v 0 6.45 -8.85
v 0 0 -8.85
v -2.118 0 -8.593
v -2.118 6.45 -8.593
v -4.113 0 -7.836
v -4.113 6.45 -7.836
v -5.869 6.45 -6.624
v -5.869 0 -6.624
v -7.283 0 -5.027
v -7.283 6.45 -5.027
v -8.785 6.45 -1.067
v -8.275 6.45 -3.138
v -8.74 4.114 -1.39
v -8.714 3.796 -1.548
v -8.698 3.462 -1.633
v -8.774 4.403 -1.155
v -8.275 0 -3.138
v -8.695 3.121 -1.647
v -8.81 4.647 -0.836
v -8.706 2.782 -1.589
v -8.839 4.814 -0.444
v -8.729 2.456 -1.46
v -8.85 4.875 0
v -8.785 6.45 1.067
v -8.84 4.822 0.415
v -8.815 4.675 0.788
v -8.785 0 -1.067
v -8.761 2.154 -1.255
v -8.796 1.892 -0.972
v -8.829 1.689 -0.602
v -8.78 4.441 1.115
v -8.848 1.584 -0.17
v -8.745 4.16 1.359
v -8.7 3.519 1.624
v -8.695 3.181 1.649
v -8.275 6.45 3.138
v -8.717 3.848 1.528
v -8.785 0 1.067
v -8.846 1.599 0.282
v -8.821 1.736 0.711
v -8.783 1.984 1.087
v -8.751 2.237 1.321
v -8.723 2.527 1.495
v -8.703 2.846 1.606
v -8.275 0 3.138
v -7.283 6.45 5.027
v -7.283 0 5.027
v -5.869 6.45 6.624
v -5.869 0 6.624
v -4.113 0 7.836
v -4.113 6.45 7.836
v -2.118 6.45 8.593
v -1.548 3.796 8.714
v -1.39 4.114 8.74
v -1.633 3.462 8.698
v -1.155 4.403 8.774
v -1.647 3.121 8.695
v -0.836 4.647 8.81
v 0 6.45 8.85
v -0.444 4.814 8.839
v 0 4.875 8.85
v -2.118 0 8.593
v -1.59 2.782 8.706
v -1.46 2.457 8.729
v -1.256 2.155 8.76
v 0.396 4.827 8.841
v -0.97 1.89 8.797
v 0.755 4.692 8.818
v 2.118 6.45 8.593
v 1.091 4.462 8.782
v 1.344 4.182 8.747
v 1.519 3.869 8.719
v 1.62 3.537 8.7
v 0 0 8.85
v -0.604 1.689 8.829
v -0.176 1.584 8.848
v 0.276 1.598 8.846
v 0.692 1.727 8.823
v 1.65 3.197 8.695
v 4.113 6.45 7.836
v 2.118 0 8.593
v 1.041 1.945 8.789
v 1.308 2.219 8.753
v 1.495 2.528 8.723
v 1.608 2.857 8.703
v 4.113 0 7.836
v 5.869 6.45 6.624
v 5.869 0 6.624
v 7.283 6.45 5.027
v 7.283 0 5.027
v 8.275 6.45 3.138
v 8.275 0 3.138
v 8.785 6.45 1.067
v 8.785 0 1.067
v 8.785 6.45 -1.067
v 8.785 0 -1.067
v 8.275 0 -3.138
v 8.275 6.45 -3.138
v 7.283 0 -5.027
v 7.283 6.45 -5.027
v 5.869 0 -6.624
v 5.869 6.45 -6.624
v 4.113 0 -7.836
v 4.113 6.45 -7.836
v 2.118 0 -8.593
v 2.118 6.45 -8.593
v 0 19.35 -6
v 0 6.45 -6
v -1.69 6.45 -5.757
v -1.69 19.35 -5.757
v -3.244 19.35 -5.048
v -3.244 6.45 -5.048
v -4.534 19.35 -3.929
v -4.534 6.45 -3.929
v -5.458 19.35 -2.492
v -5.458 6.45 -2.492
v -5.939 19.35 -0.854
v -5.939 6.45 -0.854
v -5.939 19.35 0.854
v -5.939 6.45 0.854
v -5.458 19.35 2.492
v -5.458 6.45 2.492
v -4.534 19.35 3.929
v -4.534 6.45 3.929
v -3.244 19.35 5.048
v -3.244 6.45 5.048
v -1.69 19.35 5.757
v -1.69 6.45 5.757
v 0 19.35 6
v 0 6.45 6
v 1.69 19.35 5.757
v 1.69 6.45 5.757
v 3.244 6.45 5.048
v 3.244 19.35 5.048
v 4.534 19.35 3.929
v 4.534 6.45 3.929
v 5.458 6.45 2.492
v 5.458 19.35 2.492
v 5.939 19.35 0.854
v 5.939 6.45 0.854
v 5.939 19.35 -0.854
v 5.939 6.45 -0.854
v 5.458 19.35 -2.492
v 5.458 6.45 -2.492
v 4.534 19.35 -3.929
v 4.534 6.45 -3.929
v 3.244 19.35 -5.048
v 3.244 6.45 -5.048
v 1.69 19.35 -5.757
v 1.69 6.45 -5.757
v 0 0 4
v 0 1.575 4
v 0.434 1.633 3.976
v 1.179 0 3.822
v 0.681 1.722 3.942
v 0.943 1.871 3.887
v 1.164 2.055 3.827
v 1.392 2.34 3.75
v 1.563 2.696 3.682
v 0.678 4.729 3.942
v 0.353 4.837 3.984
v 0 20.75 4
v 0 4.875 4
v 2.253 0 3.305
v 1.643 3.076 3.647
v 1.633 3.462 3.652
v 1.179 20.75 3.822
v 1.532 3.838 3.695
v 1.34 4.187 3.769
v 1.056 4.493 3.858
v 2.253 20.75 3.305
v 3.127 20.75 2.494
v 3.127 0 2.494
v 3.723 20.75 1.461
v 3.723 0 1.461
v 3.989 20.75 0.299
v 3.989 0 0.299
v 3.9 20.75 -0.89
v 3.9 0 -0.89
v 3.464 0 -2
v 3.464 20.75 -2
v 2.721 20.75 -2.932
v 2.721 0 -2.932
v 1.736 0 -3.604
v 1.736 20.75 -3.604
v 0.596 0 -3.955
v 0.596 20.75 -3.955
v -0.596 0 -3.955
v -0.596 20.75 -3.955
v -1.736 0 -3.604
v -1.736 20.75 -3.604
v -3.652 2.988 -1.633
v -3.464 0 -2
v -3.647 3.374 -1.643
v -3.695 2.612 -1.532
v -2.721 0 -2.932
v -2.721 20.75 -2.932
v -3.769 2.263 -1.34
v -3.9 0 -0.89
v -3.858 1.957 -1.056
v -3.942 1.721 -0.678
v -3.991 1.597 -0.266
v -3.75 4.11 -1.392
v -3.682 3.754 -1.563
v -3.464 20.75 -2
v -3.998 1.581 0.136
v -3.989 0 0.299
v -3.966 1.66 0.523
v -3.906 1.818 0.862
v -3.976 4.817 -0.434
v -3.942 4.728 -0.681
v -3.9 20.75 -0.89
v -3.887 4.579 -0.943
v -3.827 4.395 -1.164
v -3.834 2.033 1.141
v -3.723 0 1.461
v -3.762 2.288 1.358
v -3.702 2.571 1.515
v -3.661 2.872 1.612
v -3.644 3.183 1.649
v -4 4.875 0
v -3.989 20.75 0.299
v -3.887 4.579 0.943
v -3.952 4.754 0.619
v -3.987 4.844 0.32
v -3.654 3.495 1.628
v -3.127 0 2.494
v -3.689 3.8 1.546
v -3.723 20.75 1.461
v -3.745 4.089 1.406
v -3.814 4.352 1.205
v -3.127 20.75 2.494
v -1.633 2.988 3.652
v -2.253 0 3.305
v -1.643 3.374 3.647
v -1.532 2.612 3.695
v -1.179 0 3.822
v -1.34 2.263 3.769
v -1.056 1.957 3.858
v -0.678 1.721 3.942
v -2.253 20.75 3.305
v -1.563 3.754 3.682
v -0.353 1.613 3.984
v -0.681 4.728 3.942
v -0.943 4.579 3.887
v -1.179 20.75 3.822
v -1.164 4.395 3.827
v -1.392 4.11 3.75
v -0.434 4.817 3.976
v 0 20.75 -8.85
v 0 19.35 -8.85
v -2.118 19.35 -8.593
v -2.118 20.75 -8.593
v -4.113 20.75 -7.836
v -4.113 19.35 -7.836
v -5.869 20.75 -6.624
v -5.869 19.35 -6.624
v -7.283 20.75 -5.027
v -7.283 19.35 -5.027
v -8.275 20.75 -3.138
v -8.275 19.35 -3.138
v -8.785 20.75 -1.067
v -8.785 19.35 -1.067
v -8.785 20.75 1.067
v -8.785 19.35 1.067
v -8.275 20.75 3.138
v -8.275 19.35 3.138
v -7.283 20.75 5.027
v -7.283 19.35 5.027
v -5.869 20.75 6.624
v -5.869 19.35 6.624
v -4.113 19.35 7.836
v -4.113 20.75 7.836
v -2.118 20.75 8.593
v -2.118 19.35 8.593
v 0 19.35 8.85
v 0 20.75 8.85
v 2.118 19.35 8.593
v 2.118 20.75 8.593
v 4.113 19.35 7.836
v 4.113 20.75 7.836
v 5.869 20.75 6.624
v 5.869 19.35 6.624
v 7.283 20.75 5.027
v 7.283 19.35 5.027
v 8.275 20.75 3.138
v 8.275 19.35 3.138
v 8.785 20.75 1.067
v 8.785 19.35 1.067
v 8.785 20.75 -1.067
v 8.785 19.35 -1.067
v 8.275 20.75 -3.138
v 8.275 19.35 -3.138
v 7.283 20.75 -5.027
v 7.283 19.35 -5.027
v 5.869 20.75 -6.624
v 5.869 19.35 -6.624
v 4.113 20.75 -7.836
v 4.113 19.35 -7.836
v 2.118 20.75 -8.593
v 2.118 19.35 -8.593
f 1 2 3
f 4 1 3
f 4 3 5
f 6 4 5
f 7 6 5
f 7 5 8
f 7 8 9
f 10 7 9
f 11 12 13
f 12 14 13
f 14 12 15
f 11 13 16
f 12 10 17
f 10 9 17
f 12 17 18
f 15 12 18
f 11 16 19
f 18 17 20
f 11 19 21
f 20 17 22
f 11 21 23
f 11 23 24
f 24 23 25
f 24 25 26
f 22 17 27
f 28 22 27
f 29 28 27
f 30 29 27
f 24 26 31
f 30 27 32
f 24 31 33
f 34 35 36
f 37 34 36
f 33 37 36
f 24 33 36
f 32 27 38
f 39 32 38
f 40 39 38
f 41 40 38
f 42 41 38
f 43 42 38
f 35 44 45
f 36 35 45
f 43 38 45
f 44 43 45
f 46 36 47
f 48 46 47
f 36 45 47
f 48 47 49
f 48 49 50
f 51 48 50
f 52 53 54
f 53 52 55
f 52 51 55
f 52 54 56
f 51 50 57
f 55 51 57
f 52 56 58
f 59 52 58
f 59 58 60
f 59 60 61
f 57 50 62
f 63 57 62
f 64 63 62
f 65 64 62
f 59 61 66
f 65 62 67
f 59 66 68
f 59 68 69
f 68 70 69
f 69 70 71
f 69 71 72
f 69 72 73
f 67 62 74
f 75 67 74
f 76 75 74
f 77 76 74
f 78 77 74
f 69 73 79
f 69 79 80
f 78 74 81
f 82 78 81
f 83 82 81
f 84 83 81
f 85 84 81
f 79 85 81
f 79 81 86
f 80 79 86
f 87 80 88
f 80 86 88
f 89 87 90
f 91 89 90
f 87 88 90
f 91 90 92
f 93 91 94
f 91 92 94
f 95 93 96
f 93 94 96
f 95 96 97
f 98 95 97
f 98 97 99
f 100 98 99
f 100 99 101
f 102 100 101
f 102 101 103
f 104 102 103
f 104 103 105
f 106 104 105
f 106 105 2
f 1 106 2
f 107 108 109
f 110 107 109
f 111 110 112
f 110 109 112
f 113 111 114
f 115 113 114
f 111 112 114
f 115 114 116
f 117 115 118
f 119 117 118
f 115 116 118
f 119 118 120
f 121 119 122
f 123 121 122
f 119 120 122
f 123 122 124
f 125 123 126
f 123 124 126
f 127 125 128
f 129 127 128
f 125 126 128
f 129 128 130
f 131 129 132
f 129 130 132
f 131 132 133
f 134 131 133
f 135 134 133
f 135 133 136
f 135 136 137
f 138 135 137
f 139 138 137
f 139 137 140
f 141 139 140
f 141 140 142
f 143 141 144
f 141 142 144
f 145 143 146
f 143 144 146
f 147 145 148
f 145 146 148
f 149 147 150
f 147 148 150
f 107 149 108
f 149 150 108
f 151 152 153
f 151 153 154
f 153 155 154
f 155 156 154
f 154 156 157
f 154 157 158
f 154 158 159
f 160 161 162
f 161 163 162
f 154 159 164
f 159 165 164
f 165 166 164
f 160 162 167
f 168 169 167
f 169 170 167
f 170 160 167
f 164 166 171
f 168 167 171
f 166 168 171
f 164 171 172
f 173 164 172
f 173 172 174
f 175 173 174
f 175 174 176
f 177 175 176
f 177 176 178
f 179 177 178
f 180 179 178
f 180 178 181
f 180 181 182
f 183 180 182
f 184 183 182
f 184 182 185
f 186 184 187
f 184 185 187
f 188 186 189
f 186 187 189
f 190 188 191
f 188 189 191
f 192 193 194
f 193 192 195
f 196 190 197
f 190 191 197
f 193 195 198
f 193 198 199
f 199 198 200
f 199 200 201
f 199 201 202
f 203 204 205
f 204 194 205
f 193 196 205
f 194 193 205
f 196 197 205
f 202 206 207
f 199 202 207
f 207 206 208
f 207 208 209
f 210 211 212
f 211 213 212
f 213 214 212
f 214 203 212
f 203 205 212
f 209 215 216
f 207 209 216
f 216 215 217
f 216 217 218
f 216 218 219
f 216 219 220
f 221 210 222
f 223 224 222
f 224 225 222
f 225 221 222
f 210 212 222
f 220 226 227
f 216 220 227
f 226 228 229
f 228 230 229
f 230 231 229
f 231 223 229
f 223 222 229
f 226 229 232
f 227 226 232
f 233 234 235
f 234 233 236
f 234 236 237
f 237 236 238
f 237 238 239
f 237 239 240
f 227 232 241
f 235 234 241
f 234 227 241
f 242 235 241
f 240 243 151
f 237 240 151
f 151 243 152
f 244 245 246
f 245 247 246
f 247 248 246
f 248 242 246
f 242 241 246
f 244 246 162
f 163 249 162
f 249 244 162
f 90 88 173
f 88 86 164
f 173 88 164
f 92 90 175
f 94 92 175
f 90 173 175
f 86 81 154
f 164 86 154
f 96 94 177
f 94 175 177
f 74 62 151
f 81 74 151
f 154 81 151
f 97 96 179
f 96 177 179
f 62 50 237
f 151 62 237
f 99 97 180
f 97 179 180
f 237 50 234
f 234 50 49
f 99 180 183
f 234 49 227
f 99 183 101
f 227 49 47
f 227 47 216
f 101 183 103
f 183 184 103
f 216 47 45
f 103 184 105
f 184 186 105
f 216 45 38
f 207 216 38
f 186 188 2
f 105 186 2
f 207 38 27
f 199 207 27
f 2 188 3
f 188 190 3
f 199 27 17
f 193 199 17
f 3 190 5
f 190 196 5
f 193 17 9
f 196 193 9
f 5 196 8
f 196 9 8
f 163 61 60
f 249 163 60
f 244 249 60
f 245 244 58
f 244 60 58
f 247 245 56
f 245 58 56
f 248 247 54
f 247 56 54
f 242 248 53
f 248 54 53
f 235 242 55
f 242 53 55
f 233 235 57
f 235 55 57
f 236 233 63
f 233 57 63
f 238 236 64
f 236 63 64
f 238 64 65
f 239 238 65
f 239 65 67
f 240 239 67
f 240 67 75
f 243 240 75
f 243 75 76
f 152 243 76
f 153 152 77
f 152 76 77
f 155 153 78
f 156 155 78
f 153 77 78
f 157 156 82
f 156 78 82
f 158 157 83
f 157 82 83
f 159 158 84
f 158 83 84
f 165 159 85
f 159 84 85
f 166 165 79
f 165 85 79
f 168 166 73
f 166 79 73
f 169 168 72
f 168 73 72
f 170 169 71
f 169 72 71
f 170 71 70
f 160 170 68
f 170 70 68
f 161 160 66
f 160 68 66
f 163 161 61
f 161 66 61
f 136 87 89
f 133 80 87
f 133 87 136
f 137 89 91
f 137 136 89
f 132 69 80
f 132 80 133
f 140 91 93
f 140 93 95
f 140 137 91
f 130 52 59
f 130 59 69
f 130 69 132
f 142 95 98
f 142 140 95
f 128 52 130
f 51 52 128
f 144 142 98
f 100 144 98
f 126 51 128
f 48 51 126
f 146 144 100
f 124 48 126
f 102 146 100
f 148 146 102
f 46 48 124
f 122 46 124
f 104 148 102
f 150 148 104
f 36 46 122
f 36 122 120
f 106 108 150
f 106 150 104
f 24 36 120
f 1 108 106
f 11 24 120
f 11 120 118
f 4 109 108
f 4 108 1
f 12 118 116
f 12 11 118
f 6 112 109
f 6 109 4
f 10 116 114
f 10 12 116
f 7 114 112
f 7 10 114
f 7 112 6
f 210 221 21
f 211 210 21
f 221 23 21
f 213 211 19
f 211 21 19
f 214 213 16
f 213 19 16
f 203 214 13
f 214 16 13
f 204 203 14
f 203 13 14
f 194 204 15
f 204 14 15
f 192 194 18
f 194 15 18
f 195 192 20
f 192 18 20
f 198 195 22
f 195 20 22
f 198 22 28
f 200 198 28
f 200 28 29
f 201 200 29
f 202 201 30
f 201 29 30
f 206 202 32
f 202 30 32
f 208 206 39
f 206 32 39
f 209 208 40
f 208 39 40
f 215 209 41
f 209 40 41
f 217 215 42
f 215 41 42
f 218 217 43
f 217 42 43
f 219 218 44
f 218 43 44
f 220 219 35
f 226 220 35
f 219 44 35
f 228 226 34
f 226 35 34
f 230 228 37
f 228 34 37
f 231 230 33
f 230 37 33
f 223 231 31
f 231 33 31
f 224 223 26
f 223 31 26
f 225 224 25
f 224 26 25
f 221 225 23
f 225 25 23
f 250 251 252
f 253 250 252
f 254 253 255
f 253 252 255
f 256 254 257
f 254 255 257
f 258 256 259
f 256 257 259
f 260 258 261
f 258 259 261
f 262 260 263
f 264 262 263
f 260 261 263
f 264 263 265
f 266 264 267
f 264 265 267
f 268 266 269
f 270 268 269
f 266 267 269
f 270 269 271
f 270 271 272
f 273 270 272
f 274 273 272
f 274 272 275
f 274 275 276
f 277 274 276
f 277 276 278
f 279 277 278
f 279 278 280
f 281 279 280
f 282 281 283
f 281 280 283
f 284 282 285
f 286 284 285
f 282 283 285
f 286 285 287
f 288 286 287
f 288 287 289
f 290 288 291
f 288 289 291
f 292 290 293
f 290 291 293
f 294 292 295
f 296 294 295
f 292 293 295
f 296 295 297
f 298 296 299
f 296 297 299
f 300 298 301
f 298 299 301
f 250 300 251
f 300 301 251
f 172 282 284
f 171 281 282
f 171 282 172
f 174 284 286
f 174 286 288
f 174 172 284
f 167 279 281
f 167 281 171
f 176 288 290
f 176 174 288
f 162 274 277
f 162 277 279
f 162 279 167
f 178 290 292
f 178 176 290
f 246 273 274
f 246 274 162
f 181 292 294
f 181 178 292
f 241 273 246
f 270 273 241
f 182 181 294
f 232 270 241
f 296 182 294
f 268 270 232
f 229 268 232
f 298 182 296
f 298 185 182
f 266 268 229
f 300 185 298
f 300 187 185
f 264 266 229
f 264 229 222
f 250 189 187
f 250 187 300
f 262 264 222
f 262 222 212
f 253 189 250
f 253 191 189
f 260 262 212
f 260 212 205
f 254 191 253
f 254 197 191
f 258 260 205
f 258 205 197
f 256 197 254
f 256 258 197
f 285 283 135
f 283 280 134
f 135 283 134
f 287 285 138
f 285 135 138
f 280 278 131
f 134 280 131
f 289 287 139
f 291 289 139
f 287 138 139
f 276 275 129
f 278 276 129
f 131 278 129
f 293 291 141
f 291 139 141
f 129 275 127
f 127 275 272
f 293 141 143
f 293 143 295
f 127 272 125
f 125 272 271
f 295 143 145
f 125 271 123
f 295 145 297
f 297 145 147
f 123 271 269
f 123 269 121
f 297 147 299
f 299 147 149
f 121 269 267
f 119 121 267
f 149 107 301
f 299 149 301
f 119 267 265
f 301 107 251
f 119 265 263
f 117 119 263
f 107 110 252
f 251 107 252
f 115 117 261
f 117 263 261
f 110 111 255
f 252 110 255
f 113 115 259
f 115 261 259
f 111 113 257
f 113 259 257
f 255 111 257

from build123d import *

# Parameters (mm, degrees)
CROQUIS1_R              = 8.85
SALIENTE_EXTRUIR1_DEPTH = 6.45
CROQUIS2_R              = 6
SALIENTE_EXTRUIR2_DEPTH = 12.9
CROQUIS3_R              = 8.85
SALIENTE_EXTRUIR3_DEPTH = 1.4
CROQUIS4_R              = 4
CORTAR_EXTRUIR1_DEPTH   = 25.232364722
CROQUIS6_W              = 1.65
CROQUIS6_H              = 8.851
MATRIZC1_COUNT          = 2
MATRIZC1_ANGLE          = 90


with BuildPart() as part:
    # Croquis1 → Saliente-Extruir1 (new body)
    with BuildSketch(Plane(origin=(0, 0, 0), x_dir=(1, 0, 0), z_dir=(0, 1, 0))):
        with Locations(Location((0, 0, 0), (0, 0, 90))):
            Circle(CROQUIS1_R)
    extrude(amount=SALIENTE_EXTRUIR1_DEPTH)

    # Croquis2 → Saliente-Extruir2 (add)
    with BuildSketch(Plane(origin=(0, 6.45, 0), x_dir=(1, 0, 0), z_dir=(0, 1, 0))):
        with Locations(Location((0, 0, 0), (0, 0, 90))):
            Circle(CROQUIS2_R)
    extrude(amount=SALIENTE_EXTRUIR2_DEPTH)

    # Croquis3 → Saliente-Extruir3 (add)
    with BuildSketch(Plane(origin=(0, 19.35, 0), x_dir=(1, 0, 0), z_dir=(0, 1, 0))):
        with Locations(Location((0, 0, 0), (0, 0, 90))):
            Circle(CROQUIS3_R)
    extrude(amount=SALIENTE_EXTRUIR3_DEPTH)

    # Croquis4 → Cortar-Extruir1 (cut, through all)
    with BuildSketch(Plane(origin=(0, 20.75, 0), x_dir=(1, 0, 0), z_dir=(0, 1, 0))):
        with Locations(Location((0, 0, 0), (0, 0, 270))):
            Circle(CROQUIS4_R)
    extrude(amount=-CORTAR_EXTRUIR1_DEPTH, mode=Mode.SUBTRACT)

    # Croquis6 → Taladro roscado M41 (falta definir posicio) (revolve, cut)
    with BuildSketch(Plane(origin=(0, 3.225, 0), x_dir=(0, 1, 0), z_dir=(1, 0, 0))):
        with Locations((0.825, 4.4255)):
            Rectangle(CROQUIS6_W, CROQUIS6_H)
    taladro_roscado_m41_falta_definir_posic = revolve(axis=Axis((0, 3.225, -6.35), (0, 0, 1)), mode=Mode.SUBTRACT)

    # MatrizC1: Taladro roscado M41 (falta definir posicio) ×2 about axis
    matrizc1_axis = Axis((0, 6.45, 0), (0, -1, 0))
    for i in range(1, MATRIZC1_COUNT):
        add(taladro_roscado_m41_falta_definir_posic.rotate(matrizc1_axis, i * MATRIZC1_ANGLE / (MATRIZC1_COUNT - 1)), mode=Mode.SUBTRACT)


solid = part.part
